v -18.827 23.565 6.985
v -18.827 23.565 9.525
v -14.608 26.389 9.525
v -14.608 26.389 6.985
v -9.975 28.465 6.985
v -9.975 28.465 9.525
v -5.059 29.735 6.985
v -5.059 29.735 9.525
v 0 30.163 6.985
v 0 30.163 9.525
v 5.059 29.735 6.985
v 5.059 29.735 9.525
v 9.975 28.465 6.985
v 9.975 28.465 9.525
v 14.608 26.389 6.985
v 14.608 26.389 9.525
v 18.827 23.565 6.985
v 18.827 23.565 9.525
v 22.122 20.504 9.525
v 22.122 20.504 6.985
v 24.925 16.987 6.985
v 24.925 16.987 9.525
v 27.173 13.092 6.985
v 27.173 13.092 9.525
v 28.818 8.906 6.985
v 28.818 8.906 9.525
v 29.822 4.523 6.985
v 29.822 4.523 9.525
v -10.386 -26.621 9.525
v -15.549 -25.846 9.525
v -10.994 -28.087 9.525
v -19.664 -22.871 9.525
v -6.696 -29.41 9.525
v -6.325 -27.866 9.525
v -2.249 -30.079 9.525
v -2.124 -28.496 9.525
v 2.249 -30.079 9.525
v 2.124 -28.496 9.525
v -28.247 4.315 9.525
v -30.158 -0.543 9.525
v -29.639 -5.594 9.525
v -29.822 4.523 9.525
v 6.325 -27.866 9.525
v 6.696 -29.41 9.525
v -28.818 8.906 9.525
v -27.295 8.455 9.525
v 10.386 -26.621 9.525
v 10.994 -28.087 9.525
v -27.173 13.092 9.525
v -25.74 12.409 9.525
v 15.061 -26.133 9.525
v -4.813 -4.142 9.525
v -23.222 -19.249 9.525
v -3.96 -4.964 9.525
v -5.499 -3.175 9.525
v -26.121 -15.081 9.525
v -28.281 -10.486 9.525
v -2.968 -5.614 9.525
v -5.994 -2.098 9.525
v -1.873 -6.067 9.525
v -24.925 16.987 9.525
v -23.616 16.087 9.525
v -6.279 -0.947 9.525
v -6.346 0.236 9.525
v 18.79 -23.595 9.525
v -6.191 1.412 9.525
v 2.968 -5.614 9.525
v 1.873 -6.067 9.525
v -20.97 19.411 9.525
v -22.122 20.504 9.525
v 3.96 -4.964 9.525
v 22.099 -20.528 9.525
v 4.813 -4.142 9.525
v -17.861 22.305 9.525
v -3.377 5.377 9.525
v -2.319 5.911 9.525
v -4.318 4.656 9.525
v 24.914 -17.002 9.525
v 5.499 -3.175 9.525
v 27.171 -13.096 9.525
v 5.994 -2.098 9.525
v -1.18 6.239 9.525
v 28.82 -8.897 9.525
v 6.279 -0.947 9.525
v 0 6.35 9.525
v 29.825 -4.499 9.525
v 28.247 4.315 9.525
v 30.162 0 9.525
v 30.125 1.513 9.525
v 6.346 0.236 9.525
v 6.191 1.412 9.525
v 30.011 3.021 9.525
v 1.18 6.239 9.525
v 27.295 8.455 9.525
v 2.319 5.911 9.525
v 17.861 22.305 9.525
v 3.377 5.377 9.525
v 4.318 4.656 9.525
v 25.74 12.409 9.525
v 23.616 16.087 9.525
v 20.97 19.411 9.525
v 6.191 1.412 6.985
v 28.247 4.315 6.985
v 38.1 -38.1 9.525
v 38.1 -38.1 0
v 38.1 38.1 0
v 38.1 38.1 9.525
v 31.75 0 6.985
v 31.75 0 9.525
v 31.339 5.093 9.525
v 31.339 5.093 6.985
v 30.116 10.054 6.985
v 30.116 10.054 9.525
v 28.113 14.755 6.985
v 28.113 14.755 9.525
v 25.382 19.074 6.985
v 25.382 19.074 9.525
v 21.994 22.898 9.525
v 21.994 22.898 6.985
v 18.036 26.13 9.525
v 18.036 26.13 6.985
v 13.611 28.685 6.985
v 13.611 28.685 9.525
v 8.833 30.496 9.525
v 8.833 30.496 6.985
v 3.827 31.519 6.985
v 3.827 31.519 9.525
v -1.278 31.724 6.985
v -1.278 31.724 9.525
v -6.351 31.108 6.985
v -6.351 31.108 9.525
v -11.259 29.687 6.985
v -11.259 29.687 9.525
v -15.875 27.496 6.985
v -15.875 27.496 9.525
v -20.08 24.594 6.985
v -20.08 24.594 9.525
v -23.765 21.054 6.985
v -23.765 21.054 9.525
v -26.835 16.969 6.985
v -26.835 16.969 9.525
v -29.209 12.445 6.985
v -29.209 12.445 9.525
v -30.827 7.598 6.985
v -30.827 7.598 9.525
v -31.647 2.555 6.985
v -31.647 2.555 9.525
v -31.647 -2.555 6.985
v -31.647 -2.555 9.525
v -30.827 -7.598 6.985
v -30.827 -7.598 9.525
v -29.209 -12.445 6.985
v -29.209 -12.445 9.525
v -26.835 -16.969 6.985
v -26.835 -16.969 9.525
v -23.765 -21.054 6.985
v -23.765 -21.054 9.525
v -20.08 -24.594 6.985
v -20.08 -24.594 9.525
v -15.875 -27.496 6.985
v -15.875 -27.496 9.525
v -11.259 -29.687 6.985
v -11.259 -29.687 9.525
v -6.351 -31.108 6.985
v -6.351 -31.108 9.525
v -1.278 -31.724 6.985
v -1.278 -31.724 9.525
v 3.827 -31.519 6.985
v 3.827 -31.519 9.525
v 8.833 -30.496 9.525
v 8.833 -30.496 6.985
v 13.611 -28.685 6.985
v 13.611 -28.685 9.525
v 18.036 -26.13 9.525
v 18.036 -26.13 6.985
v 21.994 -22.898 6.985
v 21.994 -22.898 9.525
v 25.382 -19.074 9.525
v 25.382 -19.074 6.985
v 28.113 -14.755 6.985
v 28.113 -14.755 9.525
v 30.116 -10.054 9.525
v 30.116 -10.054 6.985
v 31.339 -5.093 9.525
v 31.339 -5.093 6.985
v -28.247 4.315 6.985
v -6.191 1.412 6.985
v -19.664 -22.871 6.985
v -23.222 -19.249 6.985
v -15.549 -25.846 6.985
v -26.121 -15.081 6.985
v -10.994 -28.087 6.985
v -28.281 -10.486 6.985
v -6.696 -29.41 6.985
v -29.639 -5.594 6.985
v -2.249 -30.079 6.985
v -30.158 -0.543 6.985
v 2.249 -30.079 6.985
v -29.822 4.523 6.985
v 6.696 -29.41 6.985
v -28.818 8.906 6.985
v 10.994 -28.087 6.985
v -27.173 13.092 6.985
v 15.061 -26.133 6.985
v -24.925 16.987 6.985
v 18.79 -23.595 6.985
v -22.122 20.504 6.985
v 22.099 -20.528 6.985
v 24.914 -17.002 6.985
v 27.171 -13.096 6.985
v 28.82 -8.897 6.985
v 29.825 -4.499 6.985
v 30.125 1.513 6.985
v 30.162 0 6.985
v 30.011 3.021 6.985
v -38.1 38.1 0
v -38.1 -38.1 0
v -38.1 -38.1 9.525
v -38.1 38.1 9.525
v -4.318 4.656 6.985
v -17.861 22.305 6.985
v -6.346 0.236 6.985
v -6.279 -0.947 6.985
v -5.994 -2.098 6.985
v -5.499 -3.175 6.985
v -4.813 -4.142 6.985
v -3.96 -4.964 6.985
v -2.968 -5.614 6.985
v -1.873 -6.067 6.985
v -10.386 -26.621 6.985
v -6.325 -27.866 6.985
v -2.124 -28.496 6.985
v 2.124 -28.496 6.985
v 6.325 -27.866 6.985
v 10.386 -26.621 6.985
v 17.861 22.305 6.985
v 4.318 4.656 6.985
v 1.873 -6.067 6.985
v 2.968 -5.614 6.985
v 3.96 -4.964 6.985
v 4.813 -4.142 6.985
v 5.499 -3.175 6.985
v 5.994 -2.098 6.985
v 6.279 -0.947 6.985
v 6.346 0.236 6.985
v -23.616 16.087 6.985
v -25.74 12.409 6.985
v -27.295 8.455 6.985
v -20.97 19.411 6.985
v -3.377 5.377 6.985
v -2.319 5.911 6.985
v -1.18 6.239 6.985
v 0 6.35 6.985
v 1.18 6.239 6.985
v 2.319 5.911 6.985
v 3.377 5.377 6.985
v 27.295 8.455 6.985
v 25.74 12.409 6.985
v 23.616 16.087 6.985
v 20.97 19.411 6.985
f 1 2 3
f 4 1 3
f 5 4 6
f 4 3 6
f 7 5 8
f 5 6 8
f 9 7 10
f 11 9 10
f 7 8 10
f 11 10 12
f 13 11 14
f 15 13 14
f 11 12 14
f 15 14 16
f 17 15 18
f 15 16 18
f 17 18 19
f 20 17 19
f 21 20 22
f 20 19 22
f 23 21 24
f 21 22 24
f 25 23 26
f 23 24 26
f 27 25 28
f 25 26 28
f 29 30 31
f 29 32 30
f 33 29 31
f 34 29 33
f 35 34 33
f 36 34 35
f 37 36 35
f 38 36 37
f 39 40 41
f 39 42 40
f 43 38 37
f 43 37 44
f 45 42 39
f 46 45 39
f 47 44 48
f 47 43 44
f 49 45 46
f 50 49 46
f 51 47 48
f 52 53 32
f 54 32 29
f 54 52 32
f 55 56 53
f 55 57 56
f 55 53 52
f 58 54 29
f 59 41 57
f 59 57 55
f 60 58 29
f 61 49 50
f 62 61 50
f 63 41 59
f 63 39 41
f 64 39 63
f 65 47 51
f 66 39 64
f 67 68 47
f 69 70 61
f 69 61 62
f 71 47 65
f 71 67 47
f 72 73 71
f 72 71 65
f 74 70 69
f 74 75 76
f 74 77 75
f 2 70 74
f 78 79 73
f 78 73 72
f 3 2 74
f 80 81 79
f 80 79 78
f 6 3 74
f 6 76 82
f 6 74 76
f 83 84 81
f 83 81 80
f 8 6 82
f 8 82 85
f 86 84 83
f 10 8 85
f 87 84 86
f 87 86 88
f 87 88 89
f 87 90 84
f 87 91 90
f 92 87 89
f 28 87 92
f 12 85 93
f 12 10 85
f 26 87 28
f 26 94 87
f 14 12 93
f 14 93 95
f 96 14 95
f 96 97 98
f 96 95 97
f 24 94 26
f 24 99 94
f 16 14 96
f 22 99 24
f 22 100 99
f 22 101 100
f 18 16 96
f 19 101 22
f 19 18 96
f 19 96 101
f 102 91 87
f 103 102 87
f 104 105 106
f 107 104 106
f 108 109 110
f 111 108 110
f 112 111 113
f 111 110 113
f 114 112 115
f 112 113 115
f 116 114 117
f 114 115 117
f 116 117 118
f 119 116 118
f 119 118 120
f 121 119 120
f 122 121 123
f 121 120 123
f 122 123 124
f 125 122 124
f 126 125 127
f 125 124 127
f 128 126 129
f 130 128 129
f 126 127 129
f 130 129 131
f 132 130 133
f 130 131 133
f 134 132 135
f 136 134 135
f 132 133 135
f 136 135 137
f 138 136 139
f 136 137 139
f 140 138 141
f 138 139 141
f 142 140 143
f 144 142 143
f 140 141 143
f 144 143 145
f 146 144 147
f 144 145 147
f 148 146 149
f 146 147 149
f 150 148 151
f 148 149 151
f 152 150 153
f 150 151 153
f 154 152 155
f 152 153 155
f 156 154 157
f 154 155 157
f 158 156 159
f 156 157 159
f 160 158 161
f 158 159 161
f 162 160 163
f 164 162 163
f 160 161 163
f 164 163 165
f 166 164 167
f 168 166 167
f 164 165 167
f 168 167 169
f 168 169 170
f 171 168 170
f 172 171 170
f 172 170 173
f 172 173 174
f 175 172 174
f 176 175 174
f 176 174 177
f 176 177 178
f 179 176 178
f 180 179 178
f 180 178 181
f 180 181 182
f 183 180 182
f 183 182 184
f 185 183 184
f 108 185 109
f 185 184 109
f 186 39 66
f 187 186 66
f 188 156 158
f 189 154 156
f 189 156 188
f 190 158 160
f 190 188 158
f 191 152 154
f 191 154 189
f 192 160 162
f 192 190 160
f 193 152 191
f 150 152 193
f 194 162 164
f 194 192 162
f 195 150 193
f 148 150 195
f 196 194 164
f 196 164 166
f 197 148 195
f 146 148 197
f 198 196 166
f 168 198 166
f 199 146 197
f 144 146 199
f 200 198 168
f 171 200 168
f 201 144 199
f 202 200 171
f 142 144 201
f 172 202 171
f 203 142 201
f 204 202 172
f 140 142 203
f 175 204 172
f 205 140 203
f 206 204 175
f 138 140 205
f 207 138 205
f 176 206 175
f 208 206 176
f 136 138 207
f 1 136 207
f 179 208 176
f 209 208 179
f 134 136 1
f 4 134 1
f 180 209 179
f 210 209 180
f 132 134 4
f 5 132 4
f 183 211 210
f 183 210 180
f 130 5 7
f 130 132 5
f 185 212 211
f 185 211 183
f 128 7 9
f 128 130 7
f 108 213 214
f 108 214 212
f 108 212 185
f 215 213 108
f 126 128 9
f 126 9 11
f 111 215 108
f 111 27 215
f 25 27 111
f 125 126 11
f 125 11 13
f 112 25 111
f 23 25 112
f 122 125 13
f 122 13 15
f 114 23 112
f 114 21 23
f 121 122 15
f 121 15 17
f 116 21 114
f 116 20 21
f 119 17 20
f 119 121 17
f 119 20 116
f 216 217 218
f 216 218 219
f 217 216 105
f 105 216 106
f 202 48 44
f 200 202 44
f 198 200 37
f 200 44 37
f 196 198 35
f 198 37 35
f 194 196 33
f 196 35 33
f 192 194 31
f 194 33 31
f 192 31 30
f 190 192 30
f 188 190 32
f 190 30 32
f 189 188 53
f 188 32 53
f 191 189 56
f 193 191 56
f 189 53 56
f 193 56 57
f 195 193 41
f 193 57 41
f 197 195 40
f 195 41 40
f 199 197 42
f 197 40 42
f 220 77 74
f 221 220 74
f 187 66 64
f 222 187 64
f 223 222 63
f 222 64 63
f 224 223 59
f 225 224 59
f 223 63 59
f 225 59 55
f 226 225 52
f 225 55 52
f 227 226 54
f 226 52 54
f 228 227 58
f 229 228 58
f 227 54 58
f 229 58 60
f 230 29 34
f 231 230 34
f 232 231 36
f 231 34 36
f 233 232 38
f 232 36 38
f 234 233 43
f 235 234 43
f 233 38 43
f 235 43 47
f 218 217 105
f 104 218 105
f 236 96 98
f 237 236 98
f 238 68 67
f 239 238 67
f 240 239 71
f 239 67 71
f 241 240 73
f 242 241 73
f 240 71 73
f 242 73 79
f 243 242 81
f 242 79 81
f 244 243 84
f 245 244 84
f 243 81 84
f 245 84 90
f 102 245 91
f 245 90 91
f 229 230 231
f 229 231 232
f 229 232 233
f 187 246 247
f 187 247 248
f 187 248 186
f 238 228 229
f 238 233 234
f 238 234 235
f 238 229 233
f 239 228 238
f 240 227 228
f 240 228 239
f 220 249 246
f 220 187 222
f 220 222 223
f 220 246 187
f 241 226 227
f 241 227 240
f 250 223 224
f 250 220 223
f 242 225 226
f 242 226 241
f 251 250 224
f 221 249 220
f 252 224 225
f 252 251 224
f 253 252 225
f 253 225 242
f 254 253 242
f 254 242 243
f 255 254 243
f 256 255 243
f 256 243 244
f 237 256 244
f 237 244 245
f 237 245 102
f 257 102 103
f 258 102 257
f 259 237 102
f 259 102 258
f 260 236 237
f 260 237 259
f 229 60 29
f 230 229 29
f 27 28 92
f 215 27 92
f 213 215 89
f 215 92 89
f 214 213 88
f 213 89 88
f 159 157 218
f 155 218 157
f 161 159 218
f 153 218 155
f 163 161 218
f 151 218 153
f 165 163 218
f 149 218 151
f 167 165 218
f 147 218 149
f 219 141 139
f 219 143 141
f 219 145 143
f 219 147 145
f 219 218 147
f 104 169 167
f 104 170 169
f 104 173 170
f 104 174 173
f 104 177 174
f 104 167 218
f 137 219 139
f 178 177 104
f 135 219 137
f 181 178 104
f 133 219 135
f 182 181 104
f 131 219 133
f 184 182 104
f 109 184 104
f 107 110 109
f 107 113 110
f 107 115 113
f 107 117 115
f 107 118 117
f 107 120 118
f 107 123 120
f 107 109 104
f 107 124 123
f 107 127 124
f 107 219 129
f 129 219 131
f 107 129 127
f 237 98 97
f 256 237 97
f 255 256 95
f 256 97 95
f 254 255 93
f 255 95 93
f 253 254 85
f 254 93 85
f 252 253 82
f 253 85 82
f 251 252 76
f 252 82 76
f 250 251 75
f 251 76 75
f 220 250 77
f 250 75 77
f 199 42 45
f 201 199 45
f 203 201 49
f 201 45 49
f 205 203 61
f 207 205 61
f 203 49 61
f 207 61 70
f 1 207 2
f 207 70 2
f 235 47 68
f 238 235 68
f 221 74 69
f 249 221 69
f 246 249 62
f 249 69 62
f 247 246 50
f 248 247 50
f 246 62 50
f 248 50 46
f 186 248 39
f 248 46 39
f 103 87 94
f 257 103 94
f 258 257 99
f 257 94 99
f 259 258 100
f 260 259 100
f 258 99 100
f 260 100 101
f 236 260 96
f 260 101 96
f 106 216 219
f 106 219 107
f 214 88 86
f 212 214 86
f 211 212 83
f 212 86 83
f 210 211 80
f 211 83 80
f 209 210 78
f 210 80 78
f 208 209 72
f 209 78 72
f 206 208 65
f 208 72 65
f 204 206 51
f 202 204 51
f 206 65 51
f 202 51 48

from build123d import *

# Parameters (mm, degrees)
F0_W     = 76.2
F0_H     = 76.2
F1_DEPTH = 9.525
F2_R     = 31.75
F3_DEPTH = 2.54


with BuildPart() as f1:
    # F0 (on Top) → F1 (new body)
    with BuildSketch(Plane.XY):
        Rectangle(F0_W, F0_H)
    extrude(amount=F1_DEPTH)

    # F2 (on face) → F3 (cut)
    with BuildSketch(Plane.XY.offset(9.525)):
        Circle(F2_R)
        with BuildLine():
            ThreePointArc((29.8215182706, 4.5225495338), (30.0771337654, 2.2676928157), (30.1625, 0))
            ThreePointArc((30.1625, 0), (24.913715506, -17.0024464691), (10.9941163492, -28.0874671687))
            ThreePointArc((10.9941163492, -28.0874671687), (0, -30.1625), (-10.9941163492, -28.0874671687))
            ThreePointArc((-10.9941163492, -28.0874671687), (-26.1214912416, -15.08125), (-29.8215182706, 4.5225495338))
            ThreePointArc((-29.8215182706, 4.5225495338), (-26.1214912416, 15.08125), (-18.8274019215, 23.5649176349))
            ThreePointArc((-18.8274019215, 23.5649176349), (0, 30.1625), (18.8274019215, 23.5649176349))
            ThreePointArc((18.8274019215, 23.5649176349), (26.1214912416, 15.08125), (29.8215182706, 4.5225495338))
        make_face(mode=Mode.SUBTRACT)
        with BuildLine():
            Line((6.1911249981, 1.4115492405), (28.2472801431, 4.3152971525))
            ThreePointArc((28.2472801431, 4.3152971525), (24.7466759131, 14.2875), (17.8607970305, 22.3052136155))
            Line((17.8607970305, 22.3052136155), (4.318, 4.6558969061))
            ThreePointArc((4.318, 4.6558969061), (0, 6.35), (-4.318, 4.6558969061))
            Line((-4.318, 4.6558969061), (-17.8607970305, 22.3052136155))
            ThreePointArc((-17.8607970305, 22.3052136155), (-24.7466759131, 14.2875), (-28.2472801431, 4.3152971525))
            Line((-28.2472801431, 4.3152971525), (-6.1911249981, 1.4115492405))
            ThreePointArc((-6.1911249981, 1.4115492405), (-5.499261314, -3.175), (-1.8731249981, -6.0674461466))
            Line((-1.8731249981, -6.0674461466), (-10.3864831126, -26.620510768))
            ThreePointArc((-10.3864831126, -26.620510768), (0, -28.575), (10.3864831126, -26.620510768))
            Line((10.3864831126, -26.620510768), (1.8731249981, -6.0674461466))
            ThreePointArc((1.8731249981, -6.0674461466), (5.499261314, -3.175), (6.1911249981, 1.4115492405))
        make_face()
    extrude(amount=-F3_DEPTH, mode=Mode.SUBTRACT)


solid = f1.part
